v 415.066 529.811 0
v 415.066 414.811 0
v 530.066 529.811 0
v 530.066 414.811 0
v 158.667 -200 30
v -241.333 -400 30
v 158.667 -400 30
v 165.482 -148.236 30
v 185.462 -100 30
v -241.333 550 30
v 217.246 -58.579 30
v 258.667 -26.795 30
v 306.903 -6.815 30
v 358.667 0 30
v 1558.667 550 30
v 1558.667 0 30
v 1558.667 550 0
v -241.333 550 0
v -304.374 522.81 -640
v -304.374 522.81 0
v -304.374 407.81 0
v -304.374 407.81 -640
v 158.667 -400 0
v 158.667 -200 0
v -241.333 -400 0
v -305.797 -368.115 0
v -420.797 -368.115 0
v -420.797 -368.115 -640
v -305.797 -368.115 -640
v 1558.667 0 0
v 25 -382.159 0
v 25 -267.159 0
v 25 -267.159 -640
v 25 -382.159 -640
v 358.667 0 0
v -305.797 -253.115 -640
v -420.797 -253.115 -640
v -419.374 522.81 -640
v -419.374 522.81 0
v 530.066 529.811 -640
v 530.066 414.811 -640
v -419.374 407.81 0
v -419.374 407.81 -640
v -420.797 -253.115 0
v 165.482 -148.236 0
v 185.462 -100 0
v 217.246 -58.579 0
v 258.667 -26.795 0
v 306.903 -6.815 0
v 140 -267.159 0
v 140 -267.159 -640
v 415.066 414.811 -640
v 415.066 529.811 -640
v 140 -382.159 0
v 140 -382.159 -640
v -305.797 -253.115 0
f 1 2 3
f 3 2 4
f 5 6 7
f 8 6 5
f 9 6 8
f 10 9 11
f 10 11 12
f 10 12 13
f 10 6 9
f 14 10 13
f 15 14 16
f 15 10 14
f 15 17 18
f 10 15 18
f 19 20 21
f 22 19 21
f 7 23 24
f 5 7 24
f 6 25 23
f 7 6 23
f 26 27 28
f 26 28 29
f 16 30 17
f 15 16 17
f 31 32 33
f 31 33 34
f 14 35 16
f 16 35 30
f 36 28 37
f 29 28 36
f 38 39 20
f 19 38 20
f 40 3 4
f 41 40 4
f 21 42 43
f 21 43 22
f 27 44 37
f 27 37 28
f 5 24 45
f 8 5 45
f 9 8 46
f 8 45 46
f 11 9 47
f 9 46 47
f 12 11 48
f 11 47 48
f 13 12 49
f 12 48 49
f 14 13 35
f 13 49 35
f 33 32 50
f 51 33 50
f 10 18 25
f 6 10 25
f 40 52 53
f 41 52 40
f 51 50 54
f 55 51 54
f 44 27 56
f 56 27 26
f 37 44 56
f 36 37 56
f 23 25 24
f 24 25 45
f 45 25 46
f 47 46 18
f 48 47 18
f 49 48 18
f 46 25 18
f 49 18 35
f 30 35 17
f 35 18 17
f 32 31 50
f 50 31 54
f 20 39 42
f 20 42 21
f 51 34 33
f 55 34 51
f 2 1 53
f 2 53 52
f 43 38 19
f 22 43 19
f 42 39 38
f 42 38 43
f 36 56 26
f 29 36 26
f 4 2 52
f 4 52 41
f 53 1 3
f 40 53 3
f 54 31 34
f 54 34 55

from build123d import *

# Parameters (mm, degrees)
F1_DEPTH = 30
F2_W     = 115
F2_H     = 115
F3_DEPTH = 640


with BuildPart() as f1:
    # F0 (on Top) → F1 (new body)
    with BuildSketch(Plane.XY):
        with BuildLine():
            Line((358.666953, 0), (1558.666953, 0))
            Line((1558.666953, 0), (1558.666953, 550))
            Line((1558.666953, 550), (-241.333047, 550))
            Line((-241.333047, 550), (-241.333047, 0))
            Line((-241.333047, 0), (-241.333047, -400))
            Line((-241.333047, -400), (158.666953, -400))
            Line((158.666953, -400), (158.666953, -200))
            ThreePointArc((158.666953, -200), (217.245597, -58.578644), (358.666953, 0))
        make_face()
    extrude(amount=F1_DEPTH)


with BuildPart() as f3:
    # F2 (on face) → F3 (new body)
    with BuildSketch(Plane(origin=(0, 0, 0), x_dir=(1, 0, 0), z_dir=(0, 0, -1))):
        with Locations((-361.874406, -465.310191)):
            Rectangle(F2_W, F2_H)
        with Locations((472.566004, -472.310876)):
            Rectangle(F2_W, F2_H)
        with Locations((-363.296896, 310.615311)):
            Rectangle(F2_W, F2_H)
        with Locations((82.500002, 324.659343)):
            Rectangle(F2_W, F2_H)
    extrude(amount=F3_DEPTH)


solid = Compound([f1.part, f3.part])
